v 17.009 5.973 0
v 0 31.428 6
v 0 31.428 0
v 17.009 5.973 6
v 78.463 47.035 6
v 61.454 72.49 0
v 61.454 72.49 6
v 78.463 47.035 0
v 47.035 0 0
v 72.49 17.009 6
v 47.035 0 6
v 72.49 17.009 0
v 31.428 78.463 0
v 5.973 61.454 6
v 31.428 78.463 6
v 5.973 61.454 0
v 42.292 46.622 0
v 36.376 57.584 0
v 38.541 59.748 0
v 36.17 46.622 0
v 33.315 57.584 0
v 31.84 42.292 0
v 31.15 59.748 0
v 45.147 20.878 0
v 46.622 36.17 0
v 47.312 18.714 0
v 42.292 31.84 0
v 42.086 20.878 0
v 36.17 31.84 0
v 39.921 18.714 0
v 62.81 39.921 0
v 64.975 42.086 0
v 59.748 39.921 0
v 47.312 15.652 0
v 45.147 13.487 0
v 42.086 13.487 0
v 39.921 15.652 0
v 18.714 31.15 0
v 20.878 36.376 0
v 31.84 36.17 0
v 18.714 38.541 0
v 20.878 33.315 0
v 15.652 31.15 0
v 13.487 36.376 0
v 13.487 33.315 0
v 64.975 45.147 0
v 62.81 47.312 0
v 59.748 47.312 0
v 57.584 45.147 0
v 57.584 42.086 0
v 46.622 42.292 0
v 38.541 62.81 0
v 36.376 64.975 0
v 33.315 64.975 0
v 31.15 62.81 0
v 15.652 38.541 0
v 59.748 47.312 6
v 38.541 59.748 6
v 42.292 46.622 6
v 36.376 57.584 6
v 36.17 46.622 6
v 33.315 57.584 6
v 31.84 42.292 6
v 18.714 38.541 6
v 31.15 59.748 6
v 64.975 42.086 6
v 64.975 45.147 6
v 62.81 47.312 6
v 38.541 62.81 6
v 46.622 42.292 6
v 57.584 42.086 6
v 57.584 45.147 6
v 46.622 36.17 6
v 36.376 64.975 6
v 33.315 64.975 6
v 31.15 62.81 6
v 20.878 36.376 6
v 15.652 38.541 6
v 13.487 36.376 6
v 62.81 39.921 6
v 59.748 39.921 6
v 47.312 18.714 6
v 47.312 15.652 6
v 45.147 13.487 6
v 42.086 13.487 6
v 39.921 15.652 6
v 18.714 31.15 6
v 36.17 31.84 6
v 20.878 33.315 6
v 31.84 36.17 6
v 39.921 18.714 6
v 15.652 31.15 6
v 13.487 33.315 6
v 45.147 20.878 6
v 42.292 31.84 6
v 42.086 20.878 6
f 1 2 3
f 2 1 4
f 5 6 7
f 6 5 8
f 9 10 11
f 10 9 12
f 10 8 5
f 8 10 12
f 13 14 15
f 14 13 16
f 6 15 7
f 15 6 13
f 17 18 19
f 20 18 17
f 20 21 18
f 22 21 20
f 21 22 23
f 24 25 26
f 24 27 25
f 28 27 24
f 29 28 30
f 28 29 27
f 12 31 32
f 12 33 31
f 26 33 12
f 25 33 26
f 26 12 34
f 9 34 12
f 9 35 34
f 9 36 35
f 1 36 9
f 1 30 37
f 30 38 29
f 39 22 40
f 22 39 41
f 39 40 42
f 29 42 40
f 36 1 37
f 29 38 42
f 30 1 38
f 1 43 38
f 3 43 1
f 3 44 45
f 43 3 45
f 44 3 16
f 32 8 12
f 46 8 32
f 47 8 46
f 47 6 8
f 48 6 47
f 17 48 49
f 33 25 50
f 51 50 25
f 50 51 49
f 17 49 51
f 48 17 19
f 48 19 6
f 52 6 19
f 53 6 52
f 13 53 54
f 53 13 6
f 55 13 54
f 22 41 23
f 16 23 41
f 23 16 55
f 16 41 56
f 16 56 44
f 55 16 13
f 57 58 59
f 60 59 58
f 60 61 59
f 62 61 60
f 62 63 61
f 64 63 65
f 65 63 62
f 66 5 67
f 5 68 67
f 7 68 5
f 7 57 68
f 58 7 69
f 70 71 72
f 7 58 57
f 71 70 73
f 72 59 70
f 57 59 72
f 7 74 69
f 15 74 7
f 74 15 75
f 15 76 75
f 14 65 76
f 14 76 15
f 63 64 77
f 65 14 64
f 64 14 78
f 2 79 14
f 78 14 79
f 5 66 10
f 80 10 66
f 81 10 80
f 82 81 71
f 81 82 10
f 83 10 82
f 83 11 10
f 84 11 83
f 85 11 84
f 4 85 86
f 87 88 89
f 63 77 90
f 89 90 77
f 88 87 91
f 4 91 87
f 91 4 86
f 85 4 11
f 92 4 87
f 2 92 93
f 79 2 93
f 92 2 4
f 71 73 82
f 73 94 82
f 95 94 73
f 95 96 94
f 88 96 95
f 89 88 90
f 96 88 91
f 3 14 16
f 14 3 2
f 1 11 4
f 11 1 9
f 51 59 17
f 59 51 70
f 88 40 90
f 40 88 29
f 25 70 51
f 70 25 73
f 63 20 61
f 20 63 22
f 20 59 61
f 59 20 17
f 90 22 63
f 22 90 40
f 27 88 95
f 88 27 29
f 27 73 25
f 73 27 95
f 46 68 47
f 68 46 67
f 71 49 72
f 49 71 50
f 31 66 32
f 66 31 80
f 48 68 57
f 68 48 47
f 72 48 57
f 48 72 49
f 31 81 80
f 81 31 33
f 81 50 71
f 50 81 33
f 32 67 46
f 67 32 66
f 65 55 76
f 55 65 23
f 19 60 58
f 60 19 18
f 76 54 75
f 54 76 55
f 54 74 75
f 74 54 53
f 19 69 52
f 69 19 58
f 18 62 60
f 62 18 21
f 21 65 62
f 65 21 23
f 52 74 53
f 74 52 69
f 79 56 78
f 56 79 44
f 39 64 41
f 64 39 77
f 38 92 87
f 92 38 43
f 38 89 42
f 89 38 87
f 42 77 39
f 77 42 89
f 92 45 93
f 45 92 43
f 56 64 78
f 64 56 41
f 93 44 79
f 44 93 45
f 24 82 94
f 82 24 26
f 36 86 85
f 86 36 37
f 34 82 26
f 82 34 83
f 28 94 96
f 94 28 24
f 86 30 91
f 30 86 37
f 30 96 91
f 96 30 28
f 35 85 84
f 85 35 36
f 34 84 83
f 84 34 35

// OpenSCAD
$fn = 32;

// ----------------------------------------------------------------------
// Polygon plate: 8-gon R40, 4 bolt windows
// ----------------------------------------------------------------------

// --- parameters (mm) ---
sides = 8;                // number of polygon sides
plate_r = 40;             // circumscribed radius of the polygon
bore_r = 8;               // centre bore radius
bolts = 4;                // number of bolt windows
ring_r = 22.48;           // bolt-circle radius
bolt_r = 4;               // bolt window radius
plate_t = 6;              // plate thickness, Z (extrusion height)
fit_tol = 0.1;            // declared fit tolerance (prompt contract)
free_tol = 0.3;           // declared free tolerance (prompt contract)

plate_d = 2 * plate_r;  // circumscribed diameter
bore_d = 2 * bore_r;  // centre bore diameter
bolt_d = 2 * bolt_r;  // bolt window diameter
ring_d = 2 * ring_r;  // bolt-circle diameter

profile = [[78.463, 47.035], [61.454, 72.49], [31.428, 78.463], [5.973, 61.454], [0, 31.428], [17.009, 5.973], [47.035, 0], [72.49, 17.009]];  // primary outline, 8 points, counter clockwise
void_1 = [[46.622, 42.292], [42.292, 46.622], [36.17, 46.622], [31.84, 42.292], [31.84, 36.17], [36.17, 31.84], [42.292, 31.84], [46.622, 36.17]];  // centre bore, 8 points
void_2 = [[64.975, 45.147], [62.81, 47.312], [59.748, 47.312], [57.584, 45.147], [57.584, 42.086], [59.748, 39.921], [62.81, 39.921], [64.975, 42.086]];  // bolt window 1, 8 points
void_3 = [[38.541, 62.81], [36.376, 64.975], [33.315, 64.975], [31.15, 62.81], [31.15, 59.748], [33.315, 57.584], [36.376, 57.584], [38.541, 59.748]];  // bolt window 2, 8 points
void_4 = [[20.878, 36.376], [18.714, 38.541], [15.652, 38.541], [13.487, 36.376], [13.487, 33.315], [15.652, 31.15], [18.714, 31.15], [20.878, 33.315]];  // bolt window 3, 8 points
void_5 = [[47.312, 18.714], [45.147, 20.878], [42.086, 20.878], [39.921, 18.714], [39.921, 15.652], [42.086, 13.487], [45.147, 13.487], [47.312, 15.652]];  // bolt window 4, 8 points

// --- the one profile operation ---
difference() {
  linear_extrude(height = plate_t) polygon(points = profile);
  translate([0, 0, -1])
    linear_extrude(height = plate_t + 2) polygon(points = void_1);
  translate([0, 0, -1])
    linear_extrude(height = plate_t + 2) polygon(points = void_2);
  translate([0, 0, -1])
    linear_extrude(height = plate_t + 2) polygon(points = void_3);
  translate([0, 0, -1])
    linear_extrude(height = plate_t + 2) polygon(points = void_4);
  translate([0, 0, -1])
    linear_extrude(height = plate_t + 2) polygon(points = void_5);
}
